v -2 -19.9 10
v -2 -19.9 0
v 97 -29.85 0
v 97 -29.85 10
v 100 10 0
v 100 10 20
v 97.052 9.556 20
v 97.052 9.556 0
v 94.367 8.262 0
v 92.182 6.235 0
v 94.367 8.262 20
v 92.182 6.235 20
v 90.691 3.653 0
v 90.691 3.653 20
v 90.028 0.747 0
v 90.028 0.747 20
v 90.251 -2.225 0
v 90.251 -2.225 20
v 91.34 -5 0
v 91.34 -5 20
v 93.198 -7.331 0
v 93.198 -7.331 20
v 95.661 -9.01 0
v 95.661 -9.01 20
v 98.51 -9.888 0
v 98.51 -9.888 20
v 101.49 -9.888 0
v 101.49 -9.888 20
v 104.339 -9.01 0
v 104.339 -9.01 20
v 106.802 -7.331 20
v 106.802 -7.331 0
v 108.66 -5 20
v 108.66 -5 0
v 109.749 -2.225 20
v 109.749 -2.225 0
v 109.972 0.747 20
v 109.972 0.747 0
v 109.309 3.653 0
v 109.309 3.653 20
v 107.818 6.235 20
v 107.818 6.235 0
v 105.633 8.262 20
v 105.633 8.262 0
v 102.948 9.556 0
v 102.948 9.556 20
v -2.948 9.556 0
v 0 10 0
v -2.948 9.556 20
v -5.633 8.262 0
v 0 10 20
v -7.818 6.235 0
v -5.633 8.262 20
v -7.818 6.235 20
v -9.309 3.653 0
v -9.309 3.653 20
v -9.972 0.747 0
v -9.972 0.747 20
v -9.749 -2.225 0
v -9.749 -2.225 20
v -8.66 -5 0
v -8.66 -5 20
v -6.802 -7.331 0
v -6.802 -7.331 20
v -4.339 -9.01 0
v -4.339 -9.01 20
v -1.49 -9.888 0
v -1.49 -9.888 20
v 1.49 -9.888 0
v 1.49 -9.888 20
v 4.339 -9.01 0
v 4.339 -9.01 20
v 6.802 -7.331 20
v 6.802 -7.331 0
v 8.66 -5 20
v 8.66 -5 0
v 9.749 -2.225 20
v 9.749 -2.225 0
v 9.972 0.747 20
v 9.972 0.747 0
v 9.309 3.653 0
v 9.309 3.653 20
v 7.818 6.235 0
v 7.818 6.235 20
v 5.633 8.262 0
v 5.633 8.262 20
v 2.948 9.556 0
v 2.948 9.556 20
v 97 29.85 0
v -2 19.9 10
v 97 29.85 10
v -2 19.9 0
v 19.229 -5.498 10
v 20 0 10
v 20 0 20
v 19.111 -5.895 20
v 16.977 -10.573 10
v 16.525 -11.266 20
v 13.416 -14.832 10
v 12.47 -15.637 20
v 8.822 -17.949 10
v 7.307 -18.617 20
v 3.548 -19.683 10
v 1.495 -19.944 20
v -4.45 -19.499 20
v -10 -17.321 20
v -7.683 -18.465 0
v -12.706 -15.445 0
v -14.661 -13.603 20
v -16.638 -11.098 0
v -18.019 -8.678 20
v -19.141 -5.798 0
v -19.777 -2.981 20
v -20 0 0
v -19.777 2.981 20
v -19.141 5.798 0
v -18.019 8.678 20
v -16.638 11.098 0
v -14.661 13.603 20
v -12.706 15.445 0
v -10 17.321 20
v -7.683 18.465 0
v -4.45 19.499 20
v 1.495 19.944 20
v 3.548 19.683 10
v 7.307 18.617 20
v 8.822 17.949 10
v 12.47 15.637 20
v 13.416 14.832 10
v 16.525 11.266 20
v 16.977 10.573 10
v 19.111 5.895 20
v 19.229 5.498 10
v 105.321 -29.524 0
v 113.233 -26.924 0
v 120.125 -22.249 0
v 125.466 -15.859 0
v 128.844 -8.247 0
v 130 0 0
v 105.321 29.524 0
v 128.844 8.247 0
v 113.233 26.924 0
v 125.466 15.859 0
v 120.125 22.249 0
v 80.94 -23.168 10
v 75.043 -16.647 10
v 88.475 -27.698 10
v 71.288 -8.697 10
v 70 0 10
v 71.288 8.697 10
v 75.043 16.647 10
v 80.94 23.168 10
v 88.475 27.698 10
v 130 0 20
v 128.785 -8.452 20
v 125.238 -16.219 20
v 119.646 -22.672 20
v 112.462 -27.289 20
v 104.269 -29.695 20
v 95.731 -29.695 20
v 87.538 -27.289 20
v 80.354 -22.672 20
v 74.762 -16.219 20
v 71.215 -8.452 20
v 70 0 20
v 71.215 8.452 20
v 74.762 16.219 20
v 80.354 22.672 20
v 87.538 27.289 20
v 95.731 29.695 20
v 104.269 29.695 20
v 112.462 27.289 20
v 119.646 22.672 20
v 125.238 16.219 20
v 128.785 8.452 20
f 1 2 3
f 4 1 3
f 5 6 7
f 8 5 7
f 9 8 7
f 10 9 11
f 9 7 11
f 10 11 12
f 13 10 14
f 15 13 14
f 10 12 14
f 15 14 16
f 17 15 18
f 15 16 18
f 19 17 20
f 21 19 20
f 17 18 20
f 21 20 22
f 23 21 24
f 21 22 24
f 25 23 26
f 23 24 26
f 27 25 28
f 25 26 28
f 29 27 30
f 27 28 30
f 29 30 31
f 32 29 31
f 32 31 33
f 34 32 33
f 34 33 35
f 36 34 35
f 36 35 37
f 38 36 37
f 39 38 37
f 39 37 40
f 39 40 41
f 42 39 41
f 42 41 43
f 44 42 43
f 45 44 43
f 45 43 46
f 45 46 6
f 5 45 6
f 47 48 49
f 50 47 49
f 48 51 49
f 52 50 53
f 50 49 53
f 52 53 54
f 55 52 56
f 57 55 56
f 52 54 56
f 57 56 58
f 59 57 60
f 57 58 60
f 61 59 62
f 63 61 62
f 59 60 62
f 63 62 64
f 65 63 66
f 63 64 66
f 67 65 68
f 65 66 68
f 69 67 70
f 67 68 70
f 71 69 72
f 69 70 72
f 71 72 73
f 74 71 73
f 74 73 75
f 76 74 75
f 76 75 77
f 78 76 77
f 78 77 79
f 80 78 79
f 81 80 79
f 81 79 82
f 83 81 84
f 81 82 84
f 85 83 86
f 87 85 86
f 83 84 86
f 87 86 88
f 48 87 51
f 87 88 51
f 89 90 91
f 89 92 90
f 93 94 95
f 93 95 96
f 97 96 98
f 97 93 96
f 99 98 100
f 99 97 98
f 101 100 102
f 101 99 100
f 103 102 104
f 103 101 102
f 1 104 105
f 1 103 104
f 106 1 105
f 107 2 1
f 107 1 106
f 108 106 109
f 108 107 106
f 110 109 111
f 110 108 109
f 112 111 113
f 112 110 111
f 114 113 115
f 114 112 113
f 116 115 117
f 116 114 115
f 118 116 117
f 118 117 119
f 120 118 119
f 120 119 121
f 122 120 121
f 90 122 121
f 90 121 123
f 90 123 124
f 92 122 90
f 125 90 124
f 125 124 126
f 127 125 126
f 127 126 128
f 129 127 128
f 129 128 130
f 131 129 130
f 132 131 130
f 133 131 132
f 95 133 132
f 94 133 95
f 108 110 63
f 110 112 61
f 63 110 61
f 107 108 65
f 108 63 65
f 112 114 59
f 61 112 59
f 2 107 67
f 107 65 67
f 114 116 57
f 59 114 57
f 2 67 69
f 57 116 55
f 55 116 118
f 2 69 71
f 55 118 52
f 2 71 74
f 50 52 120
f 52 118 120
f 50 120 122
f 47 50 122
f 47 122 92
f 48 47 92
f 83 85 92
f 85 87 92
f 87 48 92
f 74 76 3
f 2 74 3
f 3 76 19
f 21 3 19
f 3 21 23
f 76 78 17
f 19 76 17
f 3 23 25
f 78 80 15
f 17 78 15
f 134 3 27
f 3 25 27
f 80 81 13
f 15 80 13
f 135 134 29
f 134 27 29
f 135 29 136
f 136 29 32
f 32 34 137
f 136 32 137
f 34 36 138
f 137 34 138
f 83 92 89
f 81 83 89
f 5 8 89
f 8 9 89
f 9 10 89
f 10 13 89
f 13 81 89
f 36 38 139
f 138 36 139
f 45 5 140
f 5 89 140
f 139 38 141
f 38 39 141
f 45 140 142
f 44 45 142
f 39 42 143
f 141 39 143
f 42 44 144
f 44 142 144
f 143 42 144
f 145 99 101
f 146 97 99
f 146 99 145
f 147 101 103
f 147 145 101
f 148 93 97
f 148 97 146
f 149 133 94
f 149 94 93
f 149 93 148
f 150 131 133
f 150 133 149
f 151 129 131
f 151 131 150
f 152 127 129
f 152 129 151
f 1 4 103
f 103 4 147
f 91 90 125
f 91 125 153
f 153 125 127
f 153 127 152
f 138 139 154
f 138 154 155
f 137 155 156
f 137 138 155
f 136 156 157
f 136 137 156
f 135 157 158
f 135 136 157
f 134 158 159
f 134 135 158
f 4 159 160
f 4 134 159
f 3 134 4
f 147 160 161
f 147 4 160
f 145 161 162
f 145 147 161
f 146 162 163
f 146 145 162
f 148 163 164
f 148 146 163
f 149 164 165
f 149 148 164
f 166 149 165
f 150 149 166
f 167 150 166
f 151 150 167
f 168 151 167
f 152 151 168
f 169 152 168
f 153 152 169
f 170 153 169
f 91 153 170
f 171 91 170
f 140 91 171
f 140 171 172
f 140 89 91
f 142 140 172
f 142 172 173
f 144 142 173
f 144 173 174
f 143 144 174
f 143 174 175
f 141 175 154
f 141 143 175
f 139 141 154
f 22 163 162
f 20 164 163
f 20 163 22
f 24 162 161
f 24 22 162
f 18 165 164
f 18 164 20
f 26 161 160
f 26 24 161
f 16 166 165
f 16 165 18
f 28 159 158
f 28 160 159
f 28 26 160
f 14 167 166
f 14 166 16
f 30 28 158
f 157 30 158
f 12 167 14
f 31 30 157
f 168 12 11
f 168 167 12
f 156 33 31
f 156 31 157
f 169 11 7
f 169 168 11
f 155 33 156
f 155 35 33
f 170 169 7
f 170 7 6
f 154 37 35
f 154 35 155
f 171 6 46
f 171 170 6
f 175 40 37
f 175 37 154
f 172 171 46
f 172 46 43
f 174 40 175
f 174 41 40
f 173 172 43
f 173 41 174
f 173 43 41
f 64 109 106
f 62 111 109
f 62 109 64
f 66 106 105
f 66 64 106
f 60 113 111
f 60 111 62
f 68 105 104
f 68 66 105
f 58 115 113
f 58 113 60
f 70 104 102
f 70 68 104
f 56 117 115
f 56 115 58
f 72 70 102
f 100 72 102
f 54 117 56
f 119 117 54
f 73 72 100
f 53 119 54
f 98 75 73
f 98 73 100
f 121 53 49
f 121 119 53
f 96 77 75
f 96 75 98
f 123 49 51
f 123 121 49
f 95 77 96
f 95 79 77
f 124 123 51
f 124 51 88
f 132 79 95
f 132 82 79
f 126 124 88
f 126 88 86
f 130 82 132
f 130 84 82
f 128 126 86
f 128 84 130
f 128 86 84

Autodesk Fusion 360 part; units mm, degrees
sketch "Sketch1" plane through (0, 0, 0) normal (0, 0, 1) x (1, 0, 0)
  line L0 (0, 0) -> (100, 0) construction
  line L1 (100, 0) -> (0, 0) construction
  circle A0 centre (0, 0) radius 20
  circle A1 centre (100, 0) radius 30
  line L2 (-2, 19.8997) -> (97, 29.8496)
  line L3 (-2, -19.8997) -> (97, -29.8496)
  circle A2 centre (0, 0) radius 10
  circle A3 centre (100, 0) radius 10
  dimension "d1" = 100
  dimension "d2" = 40
  dimension "d3" = 60
  dimension "d4" = 20
  dimension "d5" = 20
extrude "Extrude1" add sketch "Sketch1" along normal blind 20 contours A0 | A1 | A2 | A3 makes body 1 at (19.9751, 0.9969, 6.6667) makes body 2 at (129.8509, -2.987, 6.6667)
extrude "Extrude2" add sketch "Sketch1" along normal blind 10 contours A0 A1 L2 L3 bodies 1 2
hole "Hole1" at (100, 0, 0) direction (0, 0, 1) diameter 20 depth 40 tip angle 180 bodies 1
hole "Hole2" at (0, 0, 0) direction (0, 0, 1) diameter 20 end through all bodies 1 1
